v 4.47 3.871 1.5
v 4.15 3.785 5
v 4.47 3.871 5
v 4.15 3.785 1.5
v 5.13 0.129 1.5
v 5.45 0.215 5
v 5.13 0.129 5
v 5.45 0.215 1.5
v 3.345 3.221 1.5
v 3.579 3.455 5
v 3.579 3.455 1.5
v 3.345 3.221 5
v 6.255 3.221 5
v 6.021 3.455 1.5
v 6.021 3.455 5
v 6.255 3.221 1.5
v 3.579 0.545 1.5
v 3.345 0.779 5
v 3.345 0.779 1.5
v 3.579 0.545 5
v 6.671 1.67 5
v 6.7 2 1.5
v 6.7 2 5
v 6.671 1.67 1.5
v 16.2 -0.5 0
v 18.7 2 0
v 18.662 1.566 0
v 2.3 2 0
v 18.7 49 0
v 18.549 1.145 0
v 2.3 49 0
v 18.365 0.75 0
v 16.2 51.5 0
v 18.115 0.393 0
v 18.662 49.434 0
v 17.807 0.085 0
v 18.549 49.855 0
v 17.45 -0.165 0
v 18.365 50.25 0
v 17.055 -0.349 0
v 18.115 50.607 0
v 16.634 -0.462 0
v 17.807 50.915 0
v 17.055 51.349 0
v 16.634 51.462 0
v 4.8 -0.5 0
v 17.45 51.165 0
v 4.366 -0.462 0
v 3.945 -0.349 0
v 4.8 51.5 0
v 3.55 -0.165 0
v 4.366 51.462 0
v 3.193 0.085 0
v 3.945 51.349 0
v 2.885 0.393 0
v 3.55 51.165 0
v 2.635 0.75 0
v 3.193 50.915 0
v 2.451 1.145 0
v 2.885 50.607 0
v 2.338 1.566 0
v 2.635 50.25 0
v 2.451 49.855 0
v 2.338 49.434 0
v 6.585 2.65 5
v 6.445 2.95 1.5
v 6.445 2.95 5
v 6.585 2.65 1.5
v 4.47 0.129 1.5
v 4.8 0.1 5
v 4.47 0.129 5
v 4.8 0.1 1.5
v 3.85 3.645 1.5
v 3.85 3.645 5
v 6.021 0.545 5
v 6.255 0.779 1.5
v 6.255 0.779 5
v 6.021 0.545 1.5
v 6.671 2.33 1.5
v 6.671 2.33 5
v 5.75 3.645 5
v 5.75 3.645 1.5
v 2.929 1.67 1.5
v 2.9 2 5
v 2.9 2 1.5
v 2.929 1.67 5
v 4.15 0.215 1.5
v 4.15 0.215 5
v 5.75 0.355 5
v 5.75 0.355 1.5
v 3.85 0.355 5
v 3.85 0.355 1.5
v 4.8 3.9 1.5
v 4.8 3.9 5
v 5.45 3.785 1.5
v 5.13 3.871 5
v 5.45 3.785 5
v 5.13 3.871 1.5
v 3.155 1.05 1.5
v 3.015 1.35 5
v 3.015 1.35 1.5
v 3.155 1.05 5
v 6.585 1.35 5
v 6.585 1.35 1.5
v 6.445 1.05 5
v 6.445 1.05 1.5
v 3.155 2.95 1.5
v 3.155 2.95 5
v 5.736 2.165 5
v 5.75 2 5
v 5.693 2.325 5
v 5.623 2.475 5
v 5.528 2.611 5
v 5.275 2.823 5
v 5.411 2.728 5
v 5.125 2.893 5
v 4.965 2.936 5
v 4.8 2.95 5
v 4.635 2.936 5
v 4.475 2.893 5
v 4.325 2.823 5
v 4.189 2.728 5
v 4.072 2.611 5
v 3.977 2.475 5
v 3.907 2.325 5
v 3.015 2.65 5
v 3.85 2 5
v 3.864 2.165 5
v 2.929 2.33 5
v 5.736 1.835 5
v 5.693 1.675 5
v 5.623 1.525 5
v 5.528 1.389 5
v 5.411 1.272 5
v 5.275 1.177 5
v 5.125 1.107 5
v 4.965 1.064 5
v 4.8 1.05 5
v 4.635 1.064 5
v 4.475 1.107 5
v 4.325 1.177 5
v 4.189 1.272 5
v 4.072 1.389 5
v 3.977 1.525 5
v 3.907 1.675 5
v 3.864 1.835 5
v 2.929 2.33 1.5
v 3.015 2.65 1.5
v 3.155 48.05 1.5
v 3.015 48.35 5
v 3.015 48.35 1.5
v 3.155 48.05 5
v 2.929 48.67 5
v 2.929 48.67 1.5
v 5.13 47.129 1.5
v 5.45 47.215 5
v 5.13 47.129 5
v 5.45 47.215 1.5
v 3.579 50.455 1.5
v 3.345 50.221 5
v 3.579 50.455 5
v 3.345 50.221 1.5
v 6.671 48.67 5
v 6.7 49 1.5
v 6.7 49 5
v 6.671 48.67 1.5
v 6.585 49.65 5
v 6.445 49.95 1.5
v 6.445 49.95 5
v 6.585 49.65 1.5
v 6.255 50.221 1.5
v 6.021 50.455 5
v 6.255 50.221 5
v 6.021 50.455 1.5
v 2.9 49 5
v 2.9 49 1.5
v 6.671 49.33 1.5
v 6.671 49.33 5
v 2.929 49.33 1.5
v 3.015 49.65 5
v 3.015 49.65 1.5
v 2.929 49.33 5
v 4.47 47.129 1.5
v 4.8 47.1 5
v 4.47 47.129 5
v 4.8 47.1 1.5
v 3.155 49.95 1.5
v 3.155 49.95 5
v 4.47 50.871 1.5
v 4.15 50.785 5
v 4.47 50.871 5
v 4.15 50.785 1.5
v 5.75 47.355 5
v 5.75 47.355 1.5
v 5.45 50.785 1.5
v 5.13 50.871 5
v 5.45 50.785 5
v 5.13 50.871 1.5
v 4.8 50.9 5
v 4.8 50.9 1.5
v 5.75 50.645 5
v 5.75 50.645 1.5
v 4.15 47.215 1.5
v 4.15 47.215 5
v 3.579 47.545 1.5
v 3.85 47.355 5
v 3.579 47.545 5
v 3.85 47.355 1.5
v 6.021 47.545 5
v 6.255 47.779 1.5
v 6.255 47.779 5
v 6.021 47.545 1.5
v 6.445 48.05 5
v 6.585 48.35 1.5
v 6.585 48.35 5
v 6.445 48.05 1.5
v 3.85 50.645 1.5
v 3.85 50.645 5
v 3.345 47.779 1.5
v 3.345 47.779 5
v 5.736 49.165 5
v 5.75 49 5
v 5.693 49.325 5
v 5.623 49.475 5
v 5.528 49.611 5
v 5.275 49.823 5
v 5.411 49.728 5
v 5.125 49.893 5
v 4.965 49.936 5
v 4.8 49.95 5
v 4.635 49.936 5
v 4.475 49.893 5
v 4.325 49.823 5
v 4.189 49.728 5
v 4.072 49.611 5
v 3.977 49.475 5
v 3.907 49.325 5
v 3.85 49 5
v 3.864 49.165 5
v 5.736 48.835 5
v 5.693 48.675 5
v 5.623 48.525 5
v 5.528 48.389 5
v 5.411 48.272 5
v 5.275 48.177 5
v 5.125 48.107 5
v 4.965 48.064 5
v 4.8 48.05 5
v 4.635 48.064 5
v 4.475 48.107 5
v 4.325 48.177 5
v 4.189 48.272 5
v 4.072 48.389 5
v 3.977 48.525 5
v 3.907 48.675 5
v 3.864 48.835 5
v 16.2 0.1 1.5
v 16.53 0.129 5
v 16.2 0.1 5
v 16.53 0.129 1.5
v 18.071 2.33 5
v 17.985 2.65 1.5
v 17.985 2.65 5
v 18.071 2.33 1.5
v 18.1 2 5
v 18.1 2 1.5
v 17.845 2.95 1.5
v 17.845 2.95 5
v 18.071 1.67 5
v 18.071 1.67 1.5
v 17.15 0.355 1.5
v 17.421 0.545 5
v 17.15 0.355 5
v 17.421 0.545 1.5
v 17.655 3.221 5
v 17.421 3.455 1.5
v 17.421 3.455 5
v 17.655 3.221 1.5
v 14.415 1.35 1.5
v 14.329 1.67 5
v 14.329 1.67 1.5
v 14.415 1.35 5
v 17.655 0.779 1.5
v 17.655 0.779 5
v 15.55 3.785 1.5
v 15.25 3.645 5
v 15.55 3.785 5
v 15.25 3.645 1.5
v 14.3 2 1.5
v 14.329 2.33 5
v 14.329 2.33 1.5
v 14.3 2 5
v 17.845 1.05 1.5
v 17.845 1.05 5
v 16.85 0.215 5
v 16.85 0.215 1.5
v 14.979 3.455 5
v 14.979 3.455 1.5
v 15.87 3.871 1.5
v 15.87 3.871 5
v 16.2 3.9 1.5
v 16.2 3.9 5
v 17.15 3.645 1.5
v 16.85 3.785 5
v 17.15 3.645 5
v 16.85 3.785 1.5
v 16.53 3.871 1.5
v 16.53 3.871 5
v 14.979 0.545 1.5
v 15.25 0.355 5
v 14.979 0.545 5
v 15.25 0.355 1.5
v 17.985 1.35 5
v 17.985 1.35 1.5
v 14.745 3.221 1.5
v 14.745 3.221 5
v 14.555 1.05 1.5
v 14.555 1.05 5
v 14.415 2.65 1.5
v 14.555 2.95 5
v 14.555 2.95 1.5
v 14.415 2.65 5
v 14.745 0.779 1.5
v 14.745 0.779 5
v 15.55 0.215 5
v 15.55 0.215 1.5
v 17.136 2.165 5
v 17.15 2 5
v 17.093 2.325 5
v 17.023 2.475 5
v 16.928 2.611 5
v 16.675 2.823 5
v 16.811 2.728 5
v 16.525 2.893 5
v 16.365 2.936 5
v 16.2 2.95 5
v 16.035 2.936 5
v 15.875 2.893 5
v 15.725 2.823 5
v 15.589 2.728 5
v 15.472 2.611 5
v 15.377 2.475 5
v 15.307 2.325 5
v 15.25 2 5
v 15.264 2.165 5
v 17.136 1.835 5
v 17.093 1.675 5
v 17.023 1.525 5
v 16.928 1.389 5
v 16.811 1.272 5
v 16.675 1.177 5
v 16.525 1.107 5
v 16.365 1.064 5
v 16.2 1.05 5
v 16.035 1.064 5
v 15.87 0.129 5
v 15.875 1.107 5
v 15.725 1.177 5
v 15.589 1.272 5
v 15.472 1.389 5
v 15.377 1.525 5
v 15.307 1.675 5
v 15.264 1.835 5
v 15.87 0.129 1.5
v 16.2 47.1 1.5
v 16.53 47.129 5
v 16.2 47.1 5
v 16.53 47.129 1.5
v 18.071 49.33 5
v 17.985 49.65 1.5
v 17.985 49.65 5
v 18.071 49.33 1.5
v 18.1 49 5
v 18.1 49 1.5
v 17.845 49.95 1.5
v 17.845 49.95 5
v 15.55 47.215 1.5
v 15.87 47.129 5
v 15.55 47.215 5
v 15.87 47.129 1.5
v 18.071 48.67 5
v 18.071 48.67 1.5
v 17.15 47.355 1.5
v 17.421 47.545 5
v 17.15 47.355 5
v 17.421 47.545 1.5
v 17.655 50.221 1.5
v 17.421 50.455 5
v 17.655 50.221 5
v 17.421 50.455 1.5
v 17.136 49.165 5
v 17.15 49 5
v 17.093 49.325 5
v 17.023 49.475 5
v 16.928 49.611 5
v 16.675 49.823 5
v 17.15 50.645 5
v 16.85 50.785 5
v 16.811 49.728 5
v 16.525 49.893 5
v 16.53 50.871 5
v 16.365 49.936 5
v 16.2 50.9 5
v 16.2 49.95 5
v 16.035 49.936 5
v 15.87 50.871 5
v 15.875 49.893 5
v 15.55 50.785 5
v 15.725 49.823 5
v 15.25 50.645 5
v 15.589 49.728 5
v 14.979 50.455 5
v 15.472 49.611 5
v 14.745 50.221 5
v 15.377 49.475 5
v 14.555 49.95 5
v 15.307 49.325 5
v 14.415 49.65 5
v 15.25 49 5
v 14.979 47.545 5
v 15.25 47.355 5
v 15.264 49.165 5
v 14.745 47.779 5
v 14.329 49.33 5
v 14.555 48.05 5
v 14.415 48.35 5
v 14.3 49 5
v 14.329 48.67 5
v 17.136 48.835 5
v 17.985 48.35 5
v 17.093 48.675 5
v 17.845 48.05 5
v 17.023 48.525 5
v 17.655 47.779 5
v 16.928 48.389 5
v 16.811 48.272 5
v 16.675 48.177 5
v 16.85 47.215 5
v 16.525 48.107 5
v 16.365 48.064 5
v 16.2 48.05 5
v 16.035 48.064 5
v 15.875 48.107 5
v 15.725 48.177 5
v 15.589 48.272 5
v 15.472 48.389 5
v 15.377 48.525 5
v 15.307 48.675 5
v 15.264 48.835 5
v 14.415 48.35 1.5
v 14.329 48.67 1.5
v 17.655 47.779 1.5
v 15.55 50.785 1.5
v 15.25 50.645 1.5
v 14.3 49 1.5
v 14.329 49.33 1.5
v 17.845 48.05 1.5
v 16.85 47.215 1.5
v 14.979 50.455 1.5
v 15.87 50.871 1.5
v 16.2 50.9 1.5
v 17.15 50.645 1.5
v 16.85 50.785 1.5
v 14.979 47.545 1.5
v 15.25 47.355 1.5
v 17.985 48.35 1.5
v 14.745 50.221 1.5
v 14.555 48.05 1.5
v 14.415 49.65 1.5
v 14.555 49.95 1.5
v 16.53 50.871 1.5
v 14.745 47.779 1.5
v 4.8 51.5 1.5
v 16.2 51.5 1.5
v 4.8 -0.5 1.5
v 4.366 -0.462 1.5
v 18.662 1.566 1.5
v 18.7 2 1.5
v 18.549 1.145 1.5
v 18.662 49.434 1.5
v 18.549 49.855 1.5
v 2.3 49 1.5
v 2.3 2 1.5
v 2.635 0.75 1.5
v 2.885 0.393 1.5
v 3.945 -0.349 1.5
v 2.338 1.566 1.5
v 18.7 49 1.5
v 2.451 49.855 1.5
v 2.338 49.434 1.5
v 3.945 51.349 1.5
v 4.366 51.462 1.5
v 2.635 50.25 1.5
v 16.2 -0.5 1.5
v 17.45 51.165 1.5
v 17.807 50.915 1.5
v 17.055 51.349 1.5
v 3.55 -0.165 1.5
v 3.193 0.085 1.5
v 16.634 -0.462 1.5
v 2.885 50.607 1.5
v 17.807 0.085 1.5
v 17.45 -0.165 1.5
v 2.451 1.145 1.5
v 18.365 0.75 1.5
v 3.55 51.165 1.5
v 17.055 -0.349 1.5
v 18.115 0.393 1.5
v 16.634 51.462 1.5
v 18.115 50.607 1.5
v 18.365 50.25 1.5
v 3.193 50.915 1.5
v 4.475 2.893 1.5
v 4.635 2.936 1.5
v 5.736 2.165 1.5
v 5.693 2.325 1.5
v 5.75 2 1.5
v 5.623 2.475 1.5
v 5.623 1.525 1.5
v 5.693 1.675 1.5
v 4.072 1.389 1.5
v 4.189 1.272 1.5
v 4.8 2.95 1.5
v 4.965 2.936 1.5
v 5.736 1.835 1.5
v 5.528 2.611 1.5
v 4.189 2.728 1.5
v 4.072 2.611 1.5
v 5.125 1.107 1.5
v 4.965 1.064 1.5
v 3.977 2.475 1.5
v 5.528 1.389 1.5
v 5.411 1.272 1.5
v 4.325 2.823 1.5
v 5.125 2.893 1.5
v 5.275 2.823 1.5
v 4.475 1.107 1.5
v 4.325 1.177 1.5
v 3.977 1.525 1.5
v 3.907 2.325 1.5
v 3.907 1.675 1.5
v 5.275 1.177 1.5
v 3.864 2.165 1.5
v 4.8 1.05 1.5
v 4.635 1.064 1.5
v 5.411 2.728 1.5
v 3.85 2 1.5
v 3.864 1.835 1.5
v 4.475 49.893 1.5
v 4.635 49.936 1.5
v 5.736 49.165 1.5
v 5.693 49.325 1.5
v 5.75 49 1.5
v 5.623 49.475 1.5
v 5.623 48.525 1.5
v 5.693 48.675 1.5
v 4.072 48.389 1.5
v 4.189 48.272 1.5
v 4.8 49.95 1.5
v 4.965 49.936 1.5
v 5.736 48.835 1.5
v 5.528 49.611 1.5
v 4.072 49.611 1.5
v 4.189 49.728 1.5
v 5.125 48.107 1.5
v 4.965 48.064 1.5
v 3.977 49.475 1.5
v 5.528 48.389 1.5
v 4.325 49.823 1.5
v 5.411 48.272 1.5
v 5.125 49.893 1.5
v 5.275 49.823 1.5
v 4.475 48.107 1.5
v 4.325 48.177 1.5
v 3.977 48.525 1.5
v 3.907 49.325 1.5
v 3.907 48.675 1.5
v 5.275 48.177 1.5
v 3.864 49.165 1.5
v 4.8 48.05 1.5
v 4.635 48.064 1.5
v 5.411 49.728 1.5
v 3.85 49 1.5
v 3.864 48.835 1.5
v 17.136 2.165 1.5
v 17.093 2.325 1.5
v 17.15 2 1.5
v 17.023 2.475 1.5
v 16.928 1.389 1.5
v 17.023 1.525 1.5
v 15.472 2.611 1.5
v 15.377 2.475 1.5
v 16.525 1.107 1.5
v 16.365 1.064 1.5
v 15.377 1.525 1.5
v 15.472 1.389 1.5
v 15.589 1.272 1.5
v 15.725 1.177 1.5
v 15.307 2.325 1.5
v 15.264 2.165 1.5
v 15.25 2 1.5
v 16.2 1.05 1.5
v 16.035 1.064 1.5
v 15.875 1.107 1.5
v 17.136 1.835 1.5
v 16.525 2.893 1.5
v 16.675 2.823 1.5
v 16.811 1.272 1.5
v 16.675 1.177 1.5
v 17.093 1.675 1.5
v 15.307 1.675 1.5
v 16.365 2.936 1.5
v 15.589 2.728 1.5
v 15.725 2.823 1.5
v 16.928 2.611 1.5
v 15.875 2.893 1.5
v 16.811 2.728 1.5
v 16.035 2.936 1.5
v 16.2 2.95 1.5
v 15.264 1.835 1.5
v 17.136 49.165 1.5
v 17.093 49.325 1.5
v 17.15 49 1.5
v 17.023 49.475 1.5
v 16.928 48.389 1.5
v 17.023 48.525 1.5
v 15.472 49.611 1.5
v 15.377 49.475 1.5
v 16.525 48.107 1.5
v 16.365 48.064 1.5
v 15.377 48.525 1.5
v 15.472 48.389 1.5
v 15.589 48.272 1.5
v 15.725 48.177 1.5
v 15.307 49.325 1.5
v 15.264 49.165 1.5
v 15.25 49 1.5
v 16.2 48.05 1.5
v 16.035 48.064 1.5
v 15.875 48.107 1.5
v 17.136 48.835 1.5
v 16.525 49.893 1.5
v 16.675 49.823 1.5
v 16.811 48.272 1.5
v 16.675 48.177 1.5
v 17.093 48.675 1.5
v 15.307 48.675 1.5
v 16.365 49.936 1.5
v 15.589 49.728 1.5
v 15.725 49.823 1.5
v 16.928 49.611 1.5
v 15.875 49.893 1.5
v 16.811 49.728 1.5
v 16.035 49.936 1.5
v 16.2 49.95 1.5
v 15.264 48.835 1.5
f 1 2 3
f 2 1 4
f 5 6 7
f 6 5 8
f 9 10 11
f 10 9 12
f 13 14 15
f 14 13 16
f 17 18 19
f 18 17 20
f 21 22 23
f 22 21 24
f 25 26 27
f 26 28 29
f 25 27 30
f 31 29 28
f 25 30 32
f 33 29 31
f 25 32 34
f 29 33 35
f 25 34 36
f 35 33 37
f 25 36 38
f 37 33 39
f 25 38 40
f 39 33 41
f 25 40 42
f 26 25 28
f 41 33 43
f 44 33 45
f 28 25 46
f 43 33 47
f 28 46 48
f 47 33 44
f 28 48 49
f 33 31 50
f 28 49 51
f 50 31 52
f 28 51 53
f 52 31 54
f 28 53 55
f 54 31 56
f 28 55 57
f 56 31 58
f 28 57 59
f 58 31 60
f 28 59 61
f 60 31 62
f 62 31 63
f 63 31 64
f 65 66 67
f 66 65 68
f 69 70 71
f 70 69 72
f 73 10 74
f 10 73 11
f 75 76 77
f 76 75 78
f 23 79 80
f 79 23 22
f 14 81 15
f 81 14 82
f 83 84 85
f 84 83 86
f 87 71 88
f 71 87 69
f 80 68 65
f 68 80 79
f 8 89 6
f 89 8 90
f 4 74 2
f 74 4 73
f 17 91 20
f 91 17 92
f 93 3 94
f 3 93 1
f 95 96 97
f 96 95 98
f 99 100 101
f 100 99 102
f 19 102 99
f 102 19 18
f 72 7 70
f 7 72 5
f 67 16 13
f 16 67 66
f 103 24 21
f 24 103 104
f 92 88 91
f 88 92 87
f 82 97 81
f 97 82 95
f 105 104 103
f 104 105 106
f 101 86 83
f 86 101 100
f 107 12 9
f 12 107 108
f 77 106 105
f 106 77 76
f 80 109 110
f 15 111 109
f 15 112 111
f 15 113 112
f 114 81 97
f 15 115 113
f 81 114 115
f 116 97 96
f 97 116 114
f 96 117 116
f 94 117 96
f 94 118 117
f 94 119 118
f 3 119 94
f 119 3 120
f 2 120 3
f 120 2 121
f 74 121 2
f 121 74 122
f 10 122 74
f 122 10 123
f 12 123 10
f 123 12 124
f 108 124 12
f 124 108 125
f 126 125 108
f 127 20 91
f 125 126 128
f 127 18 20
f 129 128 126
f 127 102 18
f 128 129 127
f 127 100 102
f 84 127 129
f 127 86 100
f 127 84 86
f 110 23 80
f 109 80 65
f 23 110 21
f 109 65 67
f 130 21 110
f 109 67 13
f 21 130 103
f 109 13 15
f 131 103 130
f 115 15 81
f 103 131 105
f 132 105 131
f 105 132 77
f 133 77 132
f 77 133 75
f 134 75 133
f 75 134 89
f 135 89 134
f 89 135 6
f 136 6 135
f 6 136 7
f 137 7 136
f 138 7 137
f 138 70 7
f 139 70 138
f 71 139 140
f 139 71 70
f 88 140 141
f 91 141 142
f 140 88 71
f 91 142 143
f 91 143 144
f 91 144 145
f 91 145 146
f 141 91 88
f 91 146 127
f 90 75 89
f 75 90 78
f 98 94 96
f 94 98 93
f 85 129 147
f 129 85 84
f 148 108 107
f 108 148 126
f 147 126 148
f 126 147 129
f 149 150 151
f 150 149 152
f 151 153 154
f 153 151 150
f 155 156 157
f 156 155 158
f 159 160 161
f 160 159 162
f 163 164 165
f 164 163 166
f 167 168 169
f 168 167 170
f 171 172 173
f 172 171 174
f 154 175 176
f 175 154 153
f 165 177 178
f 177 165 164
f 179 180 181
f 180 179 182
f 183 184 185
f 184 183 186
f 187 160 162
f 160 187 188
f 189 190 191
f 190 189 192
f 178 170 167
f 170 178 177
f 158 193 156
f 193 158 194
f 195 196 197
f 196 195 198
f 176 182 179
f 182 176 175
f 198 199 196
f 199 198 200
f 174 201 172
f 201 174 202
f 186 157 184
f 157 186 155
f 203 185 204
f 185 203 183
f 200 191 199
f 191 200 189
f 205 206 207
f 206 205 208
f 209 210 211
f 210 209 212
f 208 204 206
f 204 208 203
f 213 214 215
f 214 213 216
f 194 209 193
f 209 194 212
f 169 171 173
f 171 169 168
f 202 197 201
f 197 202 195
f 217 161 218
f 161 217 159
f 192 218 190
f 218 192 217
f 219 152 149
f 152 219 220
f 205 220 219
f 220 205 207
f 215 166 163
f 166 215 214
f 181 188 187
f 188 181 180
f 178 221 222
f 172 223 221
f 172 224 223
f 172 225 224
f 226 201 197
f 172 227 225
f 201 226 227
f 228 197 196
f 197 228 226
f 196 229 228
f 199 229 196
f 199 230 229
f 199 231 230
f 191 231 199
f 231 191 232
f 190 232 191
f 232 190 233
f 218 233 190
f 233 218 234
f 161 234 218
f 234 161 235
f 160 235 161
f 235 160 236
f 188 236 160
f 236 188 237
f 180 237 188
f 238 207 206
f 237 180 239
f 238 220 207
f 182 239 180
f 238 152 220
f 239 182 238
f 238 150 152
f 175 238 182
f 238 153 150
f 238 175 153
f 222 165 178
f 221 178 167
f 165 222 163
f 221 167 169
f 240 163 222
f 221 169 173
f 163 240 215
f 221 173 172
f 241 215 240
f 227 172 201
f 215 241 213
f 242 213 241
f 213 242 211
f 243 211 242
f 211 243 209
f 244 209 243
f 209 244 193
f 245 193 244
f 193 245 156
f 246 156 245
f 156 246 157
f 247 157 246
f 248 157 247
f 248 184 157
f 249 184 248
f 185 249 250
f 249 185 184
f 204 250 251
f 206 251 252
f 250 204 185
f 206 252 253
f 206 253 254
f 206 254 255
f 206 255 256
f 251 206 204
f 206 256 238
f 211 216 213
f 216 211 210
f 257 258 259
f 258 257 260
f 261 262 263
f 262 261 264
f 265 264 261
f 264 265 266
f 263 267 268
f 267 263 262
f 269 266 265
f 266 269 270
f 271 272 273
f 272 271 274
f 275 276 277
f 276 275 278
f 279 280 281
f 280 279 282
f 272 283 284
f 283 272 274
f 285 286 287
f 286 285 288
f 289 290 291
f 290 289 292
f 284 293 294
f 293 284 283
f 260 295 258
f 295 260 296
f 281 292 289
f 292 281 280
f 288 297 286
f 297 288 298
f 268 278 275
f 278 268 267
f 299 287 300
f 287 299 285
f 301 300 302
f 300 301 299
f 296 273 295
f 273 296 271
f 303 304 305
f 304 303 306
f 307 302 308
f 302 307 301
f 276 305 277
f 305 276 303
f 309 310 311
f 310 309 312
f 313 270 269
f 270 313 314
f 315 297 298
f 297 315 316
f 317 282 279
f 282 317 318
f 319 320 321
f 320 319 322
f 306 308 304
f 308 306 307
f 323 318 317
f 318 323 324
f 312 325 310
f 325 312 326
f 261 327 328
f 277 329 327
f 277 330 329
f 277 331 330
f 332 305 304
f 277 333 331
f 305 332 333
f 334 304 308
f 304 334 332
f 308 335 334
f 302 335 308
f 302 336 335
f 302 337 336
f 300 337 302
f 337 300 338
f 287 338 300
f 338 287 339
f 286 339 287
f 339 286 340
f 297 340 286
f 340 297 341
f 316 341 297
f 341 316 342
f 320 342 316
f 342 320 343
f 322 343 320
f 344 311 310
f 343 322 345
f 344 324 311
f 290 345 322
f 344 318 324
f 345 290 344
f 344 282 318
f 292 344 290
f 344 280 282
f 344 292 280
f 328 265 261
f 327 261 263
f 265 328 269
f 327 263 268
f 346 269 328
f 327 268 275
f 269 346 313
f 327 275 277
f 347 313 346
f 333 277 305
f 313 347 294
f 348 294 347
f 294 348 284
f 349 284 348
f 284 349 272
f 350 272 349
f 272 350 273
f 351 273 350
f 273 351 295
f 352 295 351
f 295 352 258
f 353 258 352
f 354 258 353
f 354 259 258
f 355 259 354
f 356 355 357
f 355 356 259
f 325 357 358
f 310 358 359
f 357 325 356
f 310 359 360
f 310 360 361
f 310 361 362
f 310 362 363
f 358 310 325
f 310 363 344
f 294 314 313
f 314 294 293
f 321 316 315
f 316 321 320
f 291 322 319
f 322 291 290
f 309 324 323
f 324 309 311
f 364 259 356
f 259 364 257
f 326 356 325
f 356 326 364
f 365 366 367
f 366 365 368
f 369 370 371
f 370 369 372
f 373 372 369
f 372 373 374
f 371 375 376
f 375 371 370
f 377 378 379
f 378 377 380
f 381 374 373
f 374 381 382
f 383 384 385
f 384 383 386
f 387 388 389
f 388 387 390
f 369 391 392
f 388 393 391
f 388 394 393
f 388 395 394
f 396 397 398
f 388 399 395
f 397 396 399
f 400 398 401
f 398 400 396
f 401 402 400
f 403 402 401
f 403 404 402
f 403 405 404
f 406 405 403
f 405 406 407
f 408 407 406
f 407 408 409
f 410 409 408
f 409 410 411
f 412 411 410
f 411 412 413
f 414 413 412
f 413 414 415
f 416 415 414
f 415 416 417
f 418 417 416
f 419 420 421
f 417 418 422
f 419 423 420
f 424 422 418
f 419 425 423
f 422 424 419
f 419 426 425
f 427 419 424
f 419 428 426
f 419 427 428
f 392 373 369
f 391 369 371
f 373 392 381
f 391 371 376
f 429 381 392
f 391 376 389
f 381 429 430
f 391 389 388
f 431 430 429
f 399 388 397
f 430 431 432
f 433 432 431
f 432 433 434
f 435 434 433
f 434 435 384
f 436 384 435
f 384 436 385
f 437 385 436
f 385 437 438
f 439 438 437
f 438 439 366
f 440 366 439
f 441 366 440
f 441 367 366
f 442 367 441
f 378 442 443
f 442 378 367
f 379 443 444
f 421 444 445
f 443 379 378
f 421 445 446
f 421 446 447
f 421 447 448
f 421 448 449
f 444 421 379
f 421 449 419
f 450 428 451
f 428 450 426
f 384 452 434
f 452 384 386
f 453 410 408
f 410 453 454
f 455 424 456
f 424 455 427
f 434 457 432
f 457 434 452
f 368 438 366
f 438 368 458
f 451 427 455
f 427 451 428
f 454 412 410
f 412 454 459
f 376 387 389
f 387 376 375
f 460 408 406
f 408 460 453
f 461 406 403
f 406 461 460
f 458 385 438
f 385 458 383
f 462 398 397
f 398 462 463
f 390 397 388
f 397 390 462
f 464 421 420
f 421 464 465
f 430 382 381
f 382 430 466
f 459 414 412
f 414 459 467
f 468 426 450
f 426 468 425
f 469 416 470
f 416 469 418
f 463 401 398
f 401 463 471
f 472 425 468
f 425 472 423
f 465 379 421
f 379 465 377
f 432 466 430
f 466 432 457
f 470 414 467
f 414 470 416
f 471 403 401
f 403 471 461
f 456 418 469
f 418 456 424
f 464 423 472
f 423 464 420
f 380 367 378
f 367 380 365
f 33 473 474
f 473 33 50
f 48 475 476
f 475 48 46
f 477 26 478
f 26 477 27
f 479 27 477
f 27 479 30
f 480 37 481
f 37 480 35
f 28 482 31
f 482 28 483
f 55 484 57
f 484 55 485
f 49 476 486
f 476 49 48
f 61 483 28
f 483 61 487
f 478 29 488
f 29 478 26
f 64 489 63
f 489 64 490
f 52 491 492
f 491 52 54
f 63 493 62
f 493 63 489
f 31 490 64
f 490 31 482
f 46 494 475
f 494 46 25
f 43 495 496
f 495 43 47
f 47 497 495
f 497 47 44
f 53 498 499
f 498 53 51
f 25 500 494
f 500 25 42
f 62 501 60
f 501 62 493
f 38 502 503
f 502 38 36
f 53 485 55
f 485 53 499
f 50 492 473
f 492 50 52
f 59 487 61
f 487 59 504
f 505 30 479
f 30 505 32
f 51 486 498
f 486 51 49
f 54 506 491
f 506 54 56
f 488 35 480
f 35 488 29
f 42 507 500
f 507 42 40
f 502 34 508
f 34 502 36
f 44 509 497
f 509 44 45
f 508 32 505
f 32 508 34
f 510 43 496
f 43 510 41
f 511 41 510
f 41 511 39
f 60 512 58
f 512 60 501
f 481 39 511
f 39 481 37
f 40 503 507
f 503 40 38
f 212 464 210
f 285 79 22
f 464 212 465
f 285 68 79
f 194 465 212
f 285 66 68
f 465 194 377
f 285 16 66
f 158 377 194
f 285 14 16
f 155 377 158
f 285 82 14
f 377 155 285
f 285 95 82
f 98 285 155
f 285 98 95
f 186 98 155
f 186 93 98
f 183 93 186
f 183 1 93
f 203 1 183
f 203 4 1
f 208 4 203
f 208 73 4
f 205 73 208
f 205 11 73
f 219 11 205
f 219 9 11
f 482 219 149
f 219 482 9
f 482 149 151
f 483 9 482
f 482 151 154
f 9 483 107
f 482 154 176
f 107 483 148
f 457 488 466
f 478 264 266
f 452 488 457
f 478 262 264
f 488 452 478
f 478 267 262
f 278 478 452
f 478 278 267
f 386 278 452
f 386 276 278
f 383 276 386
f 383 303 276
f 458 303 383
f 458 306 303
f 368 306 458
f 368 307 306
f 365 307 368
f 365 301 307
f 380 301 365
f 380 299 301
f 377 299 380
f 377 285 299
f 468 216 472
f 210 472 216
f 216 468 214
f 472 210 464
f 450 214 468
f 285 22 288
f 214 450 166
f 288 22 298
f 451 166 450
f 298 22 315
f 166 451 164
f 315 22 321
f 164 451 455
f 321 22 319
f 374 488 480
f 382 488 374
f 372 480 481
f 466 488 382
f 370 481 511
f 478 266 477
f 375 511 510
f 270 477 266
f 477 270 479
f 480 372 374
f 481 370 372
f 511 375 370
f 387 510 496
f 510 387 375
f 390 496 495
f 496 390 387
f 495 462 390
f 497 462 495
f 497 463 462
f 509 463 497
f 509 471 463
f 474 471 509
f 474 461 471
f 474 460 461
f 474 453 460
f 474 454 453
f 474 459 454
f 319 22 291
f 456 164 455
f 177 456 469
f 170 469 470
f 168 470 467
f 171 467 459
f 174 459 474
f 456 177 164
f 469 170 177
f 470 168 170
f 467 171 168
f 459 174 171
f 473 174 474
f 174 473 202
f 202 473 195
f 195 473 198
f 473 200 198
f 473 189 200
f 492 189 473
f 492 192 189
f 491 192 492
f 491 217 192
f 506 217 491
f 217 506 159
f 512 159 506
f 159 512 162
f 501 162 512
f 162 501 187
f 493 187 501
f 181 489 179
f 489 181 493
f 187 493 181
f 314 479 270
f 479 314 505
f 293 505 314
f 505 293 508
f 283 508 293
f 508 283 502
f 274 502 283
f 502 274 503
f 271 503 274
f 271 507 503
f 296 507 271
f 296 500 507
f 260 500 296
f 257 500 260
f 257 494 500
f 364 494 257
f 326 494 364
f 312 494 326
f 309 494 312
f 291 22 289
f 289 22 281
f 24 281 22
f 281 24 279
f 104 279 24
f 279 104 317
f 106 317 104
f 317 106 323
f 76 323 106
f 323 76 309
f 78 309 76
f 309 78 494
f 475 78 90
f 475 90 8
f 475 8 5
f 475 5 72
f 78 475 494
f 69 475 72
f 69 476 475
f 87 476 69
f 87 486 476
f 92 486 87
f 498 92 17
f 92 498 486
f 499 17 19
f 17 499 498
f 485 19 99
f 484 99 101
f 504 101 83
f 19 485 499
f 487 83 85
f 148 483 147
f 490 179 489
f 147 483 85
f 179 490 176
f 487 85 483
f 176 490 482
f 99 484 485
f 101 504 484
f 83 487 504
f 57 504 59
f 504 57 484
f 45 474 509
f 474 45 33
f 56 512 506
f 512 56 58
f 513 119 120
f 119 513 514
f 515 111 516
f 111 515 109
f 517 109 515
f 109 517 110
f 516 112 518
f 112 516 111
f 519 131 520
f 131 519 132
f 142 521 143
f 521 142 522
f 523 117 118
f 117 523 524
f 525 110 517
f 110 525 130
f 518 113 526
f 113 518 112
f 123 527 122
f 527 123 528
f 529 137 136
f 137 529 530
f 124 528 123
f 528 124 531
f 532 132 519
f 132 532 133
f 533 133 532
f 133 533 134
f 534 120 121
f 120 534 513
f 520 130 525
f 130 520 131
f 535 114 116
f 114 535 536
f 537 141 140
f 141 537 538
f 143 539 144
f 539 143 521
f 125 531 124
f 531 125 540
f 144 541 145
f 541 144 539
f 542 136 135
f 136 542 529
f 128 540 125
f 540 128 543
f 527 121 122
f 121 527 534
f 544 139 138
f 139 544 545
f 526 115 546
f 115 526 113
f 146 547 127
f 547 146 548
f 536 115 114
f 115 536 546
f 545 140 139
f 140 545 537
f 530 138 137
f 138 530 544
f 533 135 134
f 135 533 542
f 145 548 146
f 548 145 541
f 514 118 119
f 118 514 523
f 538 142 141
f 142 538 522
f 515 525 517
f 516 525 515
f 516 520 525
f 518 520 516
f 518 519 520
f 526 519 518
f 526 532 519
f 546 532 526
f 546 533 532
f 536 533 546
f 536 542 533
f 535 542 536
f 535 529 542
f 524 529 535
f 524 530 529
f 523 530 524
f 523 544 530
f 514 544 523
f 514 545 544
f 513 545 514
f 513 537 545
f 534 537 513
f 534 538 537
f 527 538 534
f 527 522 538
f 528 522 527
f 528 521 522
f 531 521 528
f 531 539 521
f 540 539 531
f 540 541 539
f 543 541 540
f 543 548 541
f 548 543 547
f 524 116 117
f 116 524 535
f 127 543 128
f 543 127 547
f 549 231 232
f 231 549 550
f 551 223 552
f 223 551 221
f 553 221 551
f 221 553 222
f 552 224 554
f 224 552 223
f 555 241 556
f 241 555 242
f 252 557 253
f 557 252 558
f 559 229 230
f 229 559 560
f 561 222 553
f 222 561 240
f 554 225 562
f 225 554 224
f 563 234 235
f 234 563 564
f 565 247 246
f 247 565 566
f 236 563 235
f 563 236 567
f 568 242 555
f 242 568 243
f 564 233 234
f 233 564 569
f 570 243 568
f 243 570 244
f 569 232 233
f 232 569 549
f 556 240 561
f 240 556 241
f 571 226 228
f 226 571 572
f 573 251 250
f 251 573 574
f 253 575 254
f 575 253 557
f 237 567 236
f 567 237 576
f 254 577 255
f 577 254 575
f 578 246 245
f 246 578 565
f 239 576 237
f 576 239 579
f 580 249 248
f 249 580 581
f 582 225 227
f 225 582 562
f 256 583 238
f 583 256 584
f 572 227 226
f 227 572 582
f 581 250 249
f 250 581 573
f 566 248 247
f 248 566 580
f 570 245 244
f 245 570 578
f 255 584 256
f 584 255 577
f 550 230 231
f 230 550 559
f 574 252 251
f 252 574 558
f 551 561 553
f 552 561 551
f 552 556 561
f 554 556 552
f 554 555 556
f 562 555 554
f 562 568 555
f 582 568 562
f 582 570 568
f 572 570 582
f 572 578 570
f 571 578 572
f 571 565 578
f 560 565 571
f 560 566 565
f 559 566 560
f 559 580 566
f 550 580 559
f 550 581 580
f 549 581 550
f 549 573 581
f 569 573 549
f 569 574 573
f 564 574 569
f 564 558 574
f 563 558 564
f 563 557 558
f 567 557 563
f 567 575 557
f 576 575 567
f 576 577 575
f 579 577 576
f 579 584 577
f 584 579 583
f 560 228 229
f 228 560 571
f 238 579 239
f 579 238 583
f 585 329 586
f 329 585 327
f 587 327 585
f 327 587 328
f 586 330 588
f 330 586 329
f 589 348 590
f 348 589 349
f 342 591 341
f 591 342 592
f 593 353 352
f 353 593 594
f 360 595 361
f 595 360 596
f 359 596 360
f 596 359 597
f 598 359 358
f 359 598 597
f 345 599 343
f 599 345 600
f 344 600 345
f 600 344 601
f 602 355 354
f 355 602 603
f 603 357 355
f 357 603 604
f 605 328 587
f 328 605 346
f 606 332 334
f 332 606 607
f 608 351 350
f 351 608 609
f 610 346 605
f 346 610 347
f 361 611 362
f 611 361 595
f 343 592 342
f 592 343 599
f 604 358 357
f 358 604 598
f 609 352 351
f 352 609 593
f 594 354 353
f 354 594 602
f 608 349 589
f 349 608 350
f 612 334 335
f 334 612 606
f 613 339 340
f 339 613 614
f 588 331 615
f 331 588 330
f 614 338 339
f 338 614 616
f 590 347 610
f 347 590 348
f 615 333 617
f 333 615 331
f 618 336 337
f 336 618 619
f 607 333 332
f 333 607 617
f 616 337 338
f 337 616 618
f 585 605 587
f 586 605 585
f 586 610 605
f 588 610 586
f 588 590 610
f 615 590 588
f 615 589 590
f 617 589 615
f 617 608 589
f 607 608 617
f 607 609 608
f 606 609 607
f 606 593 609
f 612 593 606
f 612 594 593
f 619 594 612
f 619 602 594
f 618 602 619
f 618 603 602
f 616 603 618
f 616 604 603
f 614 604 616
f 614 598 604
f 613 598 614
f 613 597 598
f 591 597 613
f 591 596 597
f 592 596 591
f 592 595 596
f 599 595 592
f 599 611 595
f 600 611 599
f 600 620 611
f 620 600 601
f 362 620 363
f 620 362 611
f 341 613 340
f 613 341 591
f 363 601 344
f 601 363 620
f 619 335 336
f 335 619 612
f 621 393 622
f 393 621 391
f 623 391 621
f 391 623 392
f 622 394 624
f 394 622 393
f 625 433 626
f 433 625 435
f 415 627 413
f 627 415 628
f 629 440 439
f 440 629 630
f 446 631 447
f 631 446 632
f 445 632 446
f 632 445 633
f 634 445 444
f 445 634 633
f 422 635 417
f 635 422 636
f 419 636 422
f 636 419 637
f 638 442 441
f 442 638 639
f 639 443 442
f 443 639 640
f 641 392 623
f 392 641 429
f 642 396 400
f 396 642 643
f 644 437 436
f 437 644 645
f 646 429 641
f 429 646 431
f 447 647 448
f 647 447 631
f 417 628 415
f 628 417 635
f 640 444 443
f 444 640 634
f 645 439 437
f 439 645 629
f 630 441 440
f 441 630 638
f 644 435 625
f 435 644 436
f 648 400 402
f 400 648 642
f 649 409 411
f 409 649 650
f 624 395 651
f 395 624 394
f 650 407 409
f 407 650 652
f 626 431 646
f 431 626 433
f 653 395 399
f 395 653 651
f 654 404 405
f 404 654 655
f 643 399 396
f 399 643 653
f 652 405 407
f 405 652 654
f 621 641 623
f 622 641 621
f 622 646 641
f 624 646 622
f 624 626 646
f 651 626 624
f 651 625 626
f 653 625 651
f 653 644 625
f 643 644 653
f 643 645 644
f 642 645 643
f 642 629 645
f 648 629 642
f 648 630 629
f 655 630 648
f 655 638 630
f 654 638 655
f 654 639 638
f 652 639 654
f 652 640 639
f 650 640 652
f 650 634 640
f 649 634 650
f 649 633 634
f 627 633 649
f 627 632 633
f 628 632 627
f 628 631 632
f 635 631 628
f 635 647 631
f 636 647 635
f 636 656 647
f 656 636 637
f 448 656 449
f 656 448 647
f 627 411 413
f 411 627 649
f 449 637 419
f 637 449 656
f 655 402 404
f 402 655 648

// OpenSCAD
$fn=36;
Screw=1.9;
array=[[4.8,2],[4.8,51-2],[4.8+11.4,2],[4.8+11.4,51-2]];
difference(){
    union(){
        hull() for(i=[0:3]) translate(array[i]) cylinder(h=1.5,d=5);
        for(i=[0:3]) translate(array[i]) cylinder(h=5,d=3.8);
    }
    for(i=[0:3]) translate(array[i]) translate([0,0,1.5]) cylinder(h=8,d=Screw);
}
